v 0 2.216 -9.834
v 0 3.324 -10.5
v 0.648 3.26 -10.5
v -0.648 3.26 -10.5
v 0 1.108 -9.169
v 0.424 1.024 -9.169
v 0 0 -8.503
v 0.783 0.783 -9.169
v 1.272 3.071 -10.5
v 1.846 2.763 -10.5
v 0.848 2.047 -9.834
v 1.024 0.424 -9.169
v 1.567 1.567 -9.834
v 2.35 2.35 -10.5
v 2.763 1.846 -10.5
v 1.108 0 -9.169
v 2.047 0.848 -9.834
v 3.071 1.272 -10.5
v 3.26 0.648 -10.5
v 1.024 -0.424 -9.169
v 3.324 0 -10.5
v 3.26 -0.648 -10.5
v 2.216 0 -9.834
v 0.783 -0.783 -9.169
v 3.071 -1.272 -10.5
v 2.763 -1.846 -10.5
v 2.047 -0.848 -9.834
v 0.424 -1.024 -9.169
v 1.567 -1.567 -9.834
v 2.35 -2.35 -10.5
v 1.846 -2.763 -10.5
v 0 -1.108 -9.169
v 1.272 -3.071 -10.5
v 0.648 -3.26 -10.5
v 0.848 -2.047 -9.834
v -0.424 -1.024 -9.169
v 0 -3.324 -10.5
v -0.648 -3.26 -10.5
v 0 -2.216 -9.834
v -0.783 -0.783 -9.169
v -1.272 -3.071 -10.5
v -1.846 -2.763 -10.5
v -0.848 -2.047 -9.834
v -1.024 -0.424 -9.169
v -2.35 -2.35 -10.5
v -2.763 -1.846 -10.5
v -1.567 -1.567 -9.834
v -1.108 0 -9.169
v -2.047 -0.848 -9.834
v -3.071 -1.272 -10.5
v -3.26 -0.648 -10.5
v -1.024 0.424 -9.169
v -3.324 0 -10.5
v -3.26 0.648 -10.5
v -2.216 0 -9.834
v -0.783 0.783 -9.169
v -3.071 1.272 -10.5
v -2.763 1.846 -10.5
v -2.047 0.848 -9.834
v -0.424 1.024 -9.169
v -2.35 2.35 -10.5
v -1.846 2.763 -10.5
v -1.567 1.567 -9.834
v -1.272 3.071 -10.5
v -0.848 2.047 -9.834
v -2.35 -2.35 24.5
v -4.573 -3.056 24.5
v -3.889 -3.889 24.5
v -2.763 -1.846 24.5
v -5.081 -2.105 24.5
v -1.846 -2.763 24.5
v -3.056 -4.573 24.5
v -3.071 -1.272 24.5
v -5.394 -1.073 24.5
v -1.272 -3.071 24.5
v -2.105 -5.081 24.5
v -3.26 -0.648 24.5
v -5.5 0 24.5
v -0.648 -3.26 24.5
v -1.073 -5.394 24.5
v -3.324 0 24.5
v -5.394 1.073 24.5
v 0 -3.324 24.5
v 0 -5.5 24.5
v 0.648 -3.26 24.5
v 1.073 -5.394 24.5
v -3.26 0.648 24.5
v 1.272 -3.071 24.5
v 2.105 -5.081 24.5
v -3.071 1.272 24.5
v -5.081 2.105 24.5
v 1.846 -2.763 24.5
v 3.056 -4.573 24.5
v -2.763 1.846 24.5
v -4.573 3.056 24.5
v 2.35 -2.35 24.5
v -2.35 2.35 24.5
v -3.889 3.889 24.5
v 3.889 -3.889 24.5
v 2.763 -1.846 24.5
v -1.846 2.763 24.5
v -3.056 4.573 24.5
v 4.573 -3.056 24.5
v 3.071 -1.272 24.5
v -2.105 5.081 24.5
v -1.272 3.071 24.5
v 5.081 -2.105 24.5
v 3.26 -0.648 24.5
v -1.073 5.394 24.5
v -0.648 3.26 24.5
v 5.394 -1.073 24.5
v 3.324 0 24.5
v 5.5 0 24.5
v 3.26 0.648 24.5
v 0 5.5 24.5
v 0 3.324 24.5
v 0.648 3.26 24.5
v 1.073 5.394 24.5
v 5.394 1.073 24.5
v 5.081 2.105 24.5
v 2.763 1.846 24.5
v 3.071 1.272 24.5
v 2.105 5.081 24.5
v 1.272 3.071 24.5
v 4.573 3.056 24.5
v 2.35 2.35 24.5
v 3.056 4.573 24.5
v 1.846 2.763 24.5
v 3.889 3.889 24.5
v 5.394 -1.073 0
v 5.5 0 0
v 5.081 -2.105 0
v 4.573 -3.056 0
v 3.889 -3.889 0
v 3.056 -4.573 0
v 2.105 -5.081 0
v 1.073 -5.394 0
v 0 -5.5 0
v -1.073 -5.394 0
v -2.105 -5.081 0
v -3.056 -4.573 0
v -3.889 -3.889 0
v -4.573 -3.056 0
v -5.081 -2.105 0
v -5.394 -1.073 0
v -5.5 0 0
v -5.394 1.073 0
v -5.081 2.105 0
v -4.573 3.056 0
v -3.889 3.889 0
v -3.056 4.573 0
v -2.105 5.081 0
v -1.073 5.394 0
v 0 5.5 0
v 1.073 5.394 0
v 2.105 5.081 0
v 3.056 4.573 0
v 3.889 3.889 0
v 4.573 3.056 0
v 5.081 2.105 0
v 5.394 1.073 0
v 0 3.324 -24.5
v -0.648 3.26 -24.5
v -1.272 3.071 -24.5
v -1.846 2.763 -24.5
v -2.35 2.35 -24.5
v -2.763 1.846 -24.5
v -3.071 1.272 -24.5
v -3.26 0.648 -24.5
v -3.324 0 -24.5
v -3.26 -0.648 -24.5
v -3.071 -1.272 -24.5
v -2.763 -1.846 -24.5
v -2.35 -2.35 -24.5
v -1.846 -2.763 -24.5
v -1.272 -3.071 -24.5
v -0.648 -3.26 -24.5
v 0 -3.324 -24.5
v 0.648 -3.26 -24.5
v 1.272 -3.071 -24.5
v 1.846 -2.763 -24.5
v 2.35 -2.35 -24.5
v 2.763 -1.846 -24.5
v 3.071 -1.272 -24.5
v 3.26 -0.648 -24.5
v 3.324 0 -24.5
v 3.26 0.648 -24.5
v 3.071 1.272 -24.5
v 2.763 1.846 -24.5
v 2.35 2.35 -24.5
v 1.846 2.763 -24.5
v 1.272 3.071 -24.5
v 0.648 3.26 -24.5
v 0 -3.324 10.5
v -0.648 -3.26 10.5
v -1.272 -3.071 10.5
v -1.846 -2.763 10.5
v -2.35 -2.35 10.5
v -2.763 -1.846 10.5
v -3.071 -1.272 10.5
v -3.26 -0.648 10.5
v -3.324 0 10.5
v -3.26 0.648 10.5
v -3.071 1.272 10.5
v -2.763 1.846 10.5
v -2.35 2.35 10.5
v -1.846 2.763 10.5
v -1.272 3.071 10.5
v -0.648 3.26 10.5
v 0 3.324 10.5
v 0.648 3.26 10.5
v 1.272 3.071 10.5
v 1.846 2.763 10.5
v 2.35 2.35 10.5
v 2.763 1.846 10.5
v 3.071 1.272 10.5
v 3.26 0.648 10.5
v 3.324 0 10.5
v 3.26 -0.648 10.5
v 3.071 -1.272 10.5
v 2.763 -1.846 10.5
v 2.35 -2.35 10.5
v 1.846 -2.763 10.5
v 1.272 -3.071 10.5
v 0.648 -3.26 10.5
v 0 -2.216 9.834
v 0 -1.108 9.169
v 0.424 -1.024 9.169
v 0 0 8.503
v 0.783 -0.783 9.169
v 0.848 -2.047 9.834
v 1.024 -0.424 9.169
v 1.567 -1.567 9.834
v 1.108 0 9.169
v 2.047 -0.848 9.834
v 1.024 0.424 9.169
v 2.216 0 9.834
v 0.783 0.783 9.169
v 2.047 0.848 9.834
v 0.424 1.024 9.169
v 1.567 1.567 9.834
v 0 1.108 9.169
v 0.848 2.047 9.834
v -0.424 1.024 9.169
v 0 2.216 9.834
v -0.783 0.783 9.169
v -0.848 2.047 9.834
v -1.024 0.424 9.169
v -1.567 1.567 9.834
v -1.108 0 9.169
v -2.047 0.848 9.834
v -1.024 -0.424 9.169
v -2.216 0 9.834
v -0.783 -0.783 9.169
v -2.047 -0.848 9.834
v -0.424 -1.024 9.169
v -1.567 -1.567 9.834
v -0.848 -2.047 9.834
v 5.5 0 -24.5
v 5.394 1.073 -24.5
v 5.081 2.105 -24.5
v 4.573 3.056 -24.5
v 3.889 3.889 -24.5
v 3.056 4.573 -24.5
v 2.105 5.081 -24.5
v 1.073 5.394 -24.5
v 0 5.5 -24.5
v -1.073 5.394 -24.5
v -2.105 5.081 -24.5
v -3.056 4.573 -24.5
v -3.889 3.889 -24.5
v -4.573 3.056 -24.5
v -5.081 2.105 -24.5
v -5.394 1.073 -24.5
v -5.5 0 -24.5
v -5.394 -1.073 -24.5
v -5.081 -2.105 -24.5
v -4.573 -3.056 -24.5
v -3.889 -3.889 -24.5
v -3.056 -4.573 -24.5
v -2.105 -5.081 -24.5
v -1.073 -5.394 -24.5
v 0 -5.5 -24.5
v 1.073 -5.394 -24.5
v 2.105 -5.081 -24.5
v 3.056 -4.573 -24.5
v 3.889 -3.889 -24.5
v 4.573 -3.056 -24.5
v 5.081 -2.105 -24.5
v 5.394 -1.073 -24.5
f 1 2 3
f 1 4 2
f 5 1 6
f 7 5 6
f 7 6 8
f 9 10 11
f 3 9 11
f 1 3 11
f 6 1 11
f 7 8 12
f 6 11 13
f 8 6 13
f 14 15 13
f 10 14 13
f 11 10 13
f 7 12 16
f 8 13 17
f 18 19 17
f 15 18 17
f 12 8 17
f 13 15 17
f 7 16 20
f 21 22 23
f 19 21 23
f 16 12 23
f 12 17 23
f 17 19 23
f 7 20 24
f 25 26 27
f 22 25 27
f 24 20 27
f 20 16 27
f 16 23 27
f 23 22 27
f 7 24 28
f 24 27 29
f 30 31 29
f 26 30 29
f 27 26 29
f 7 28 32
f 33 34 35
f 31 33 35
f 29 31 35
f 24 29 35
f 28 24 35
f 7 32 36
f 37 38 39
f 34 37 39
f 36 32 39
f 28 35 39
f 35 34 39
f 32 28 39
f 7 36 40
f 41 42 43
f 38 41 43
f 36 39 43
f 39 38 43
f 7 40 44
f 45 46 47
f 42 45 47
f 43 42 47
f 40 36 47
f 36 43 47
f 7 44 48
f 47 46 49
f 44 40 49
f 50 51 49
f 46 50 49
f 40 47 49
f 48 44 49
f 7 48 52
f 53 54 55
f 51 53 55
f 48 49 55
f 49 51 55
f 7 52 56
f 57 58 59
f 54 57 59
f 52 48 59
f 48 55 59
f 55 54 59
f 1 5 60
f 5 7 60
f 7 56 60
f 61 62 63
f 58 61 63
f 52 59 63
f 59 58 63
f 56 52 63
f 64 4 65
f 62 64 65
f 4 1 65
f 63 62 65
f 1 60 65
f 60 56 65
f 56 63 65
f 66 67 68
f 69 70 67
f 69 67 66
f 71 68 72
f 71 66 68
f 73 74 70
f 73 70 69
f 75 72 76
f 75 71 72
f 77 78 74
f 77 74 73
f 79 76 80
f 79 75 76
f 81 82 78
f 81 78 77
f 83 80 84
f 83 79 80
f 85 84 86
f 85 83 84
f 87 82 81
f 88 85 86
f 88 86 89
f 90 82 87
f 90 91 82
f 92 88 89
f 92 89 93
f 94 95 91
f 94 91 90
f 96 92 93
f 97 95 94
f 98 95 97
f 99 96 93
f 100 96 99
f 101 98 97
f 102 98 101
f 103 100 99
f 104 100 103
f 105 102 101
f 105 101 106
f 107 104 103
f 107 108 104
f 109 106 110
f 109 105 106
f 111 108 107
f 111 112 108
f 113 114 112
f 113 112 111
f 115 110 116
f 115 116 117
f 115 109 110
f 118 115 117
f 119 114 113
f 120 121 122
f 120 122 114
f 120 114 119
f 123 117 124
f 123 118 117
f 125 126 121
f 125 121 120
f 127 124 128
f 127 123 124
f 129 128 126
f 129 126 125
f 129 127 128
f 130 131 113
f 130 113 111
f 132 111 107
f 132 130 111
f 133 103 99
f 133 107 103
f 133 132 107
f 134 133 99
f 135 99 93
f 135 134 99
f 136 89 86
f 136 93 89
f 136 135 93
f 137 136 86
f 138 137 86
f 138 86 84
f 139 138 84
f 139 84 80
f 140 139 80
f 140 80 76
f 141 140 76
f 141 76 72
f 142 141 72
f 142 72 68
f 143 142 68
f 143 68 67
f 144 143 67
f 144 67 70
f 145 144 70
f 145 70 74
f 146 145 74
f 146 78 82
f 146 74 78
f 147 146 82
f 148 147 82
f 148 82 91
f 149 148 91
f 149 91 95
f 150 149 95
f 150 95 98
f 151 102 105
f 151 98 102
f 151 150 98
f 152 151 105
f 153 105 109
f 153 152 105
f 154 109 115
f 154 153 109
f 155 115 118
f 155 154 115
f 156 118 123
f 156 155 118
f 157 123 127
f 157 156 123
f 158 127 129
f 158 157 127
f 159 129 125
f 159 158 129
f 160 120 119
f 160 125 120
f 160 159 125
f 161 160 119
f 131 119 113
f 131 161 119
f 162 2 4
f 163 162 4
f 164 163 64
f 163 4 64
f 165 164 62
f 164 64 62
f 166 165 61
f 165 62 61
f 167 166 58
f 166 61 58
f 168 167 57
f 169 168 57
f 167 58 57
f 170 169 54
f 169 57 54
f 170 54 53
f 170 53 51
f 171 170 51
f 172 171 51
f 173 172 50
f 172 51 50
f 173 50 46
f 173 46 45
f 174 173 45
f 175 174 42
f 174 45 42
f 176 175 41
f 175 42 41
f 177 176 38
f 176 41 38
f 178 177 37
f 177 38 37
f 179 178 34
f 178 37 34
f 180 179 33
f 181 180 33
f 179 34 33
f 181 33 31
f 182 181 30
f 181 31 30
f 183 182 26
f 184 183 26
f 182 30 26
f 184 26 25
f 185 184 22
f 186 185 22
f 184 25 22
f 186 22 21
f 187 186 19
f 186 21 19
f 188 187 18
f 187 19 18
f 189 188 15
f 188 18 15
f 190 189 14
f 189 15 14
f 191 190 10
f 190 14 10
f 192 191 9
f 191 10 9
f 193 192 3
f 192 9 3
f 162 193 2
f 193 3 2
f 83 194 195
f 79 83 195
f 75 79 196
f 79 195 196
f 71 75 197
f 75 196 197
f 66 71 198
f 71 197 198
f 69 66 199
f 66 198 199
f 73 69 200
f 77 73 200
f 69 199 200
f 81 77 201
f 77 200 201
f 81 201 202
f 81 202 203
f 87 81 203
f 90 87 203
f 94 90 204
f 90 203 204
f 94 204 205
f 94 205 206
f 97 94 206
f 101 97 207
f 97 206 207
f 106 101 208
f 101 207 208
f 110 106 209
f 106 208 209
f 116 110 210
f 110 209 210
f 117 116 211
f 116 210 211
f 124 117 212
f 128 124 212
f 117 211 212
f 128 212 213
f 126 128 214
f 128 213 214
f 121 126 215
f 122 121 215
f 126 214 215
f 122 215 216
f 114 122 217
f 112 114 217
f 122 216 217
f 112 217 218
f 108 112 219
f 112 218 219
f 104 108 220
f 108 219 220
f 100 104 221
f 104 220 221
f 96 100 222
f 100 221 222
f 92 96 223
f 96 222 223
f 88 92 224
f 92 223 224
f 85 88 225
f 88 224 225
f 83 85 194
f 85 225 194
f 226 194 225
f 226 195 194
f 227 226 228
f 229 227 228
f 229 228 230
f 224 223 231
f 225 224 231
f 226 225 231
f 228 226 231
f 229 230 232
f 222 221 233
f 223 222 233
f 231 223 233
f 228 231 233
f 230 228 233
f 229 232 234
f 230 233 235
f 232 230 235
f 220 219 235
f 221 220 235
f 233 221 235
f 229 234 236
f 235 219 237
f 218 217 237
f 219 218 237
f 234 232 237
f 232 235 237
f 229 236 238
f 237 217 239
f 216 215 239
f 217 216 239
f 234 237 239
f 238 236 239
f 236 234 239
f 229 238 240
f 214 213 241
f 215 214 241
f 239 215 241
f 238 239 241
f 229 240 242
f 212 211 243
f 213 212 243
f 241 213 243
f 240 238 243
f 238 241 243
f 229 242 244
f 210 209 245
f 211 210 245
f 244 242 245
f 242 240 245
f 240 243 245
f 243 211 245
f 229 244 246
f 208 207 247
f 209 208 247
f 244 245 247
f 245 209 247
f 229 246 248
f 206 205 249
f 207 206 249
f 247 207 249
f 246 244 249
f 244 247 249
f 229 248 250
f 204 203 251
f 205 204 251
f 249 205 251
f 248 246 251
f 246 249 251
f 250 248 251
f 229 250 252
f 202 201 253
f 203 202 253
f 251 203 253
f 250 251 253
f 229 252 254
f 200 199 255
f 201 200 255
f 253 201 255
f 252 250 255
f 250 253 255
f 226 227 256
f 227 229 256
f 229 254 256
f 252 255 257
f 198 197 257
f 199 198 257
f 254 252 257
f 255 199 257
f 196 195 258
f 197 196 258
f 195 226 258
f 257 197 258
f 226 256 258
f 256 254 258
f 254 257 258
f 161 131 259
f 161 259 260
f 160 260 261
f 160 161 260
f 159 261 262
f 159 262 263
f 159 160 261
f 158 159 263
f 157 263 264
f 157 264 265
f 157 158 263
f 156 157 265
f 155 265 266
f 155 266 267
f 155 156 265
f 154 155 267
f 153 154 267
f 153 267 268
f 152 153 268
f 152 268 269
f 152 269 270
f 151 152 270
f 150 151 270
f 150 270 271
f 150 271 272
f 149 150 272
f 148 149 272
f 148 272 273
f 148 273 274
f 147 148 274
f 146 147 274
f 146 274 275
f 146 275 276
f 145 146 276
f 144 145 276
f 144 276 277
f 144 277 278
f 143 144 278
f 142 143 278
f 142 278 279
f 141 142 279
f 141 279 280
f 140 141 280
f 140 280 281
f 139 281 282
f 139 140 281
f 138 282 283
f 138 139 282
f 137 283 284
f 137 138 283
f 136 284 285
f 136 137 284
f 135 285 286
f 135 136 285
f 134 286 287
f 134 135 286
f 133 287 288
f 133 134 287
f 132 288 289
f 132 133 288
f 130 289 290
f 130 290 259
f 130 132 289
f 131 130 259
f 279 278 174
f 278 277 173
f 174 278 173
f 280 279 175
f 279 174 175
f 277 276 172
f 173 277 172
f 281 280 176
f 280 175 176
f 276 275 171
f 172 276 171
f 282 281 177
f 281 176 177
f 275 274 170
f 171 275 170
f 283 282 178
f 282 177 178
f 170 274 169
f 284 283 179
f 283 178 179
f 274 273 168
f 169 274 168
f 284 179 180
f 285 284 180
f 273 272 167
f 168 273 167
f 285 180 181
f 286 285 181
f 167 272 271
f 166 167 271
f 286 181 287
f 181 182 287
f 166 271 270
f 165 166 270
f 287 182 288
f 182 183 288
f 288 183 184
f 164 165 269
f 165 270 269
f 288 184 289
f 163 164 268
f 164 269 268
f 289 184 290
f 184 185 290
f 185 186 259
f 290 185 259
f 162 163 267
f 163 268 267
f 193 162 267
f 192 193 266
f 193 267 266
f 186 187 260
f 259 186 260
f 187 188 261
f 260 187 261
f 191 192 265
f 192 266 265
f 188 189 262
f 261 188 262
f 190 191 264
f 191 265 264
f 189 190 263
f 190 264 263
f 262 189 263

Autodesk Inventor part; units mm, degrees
ref_plane "YZ Plane" through (0, 0, 0) normal (1, 0, 0) x (0, 1, 0)
ref_plane "XZ Plane" through (0, 0, 0) normal (0, 1, 0) x (-1, 0, 0)
ref_plane "XY Plane" through (0, 0, 0) normal (0, 0, 1) x (1, 0, 0)
sketch "Skizze1" plane through (0, 0, 0) normal (0, 0, 1) x (1, 0, 0)
  circle A0 centre (0, 0) radius 5.5
  dimension "d0" = 11
extrude "Extrusion1" add sketch "Skizze1" along normal mid plane 49
sketch "Skizze2" plane through (0, 0, 24.5) normal (0, 0, 1) x (1, 0, 0)
  circle A0 centre (0, 0) radius 5.5 construction
hole "Bohrung1" at (0, 0, 24.5) direction (0, 0, -1) diameter 6.647 depth 14 tip angle 118 thread size "M8x1.25" class "6H" standard "ISO Metric profile"
sketch "Skizze3" plane through (0, 0, -24.5) normal (0, 0, -1) x (-1, 0, 0)
  circle A0 centre (0, 0) radius 5.5 construction
hole "Bohrung2" at (0, 0, -24.5) direction (0, 0, 1) diameter 6.647 depth 14 tip angle 118 thread size "M8x1.25" class "6H" standard "ISO Metric profile"
properties part number "RadBolzen"
